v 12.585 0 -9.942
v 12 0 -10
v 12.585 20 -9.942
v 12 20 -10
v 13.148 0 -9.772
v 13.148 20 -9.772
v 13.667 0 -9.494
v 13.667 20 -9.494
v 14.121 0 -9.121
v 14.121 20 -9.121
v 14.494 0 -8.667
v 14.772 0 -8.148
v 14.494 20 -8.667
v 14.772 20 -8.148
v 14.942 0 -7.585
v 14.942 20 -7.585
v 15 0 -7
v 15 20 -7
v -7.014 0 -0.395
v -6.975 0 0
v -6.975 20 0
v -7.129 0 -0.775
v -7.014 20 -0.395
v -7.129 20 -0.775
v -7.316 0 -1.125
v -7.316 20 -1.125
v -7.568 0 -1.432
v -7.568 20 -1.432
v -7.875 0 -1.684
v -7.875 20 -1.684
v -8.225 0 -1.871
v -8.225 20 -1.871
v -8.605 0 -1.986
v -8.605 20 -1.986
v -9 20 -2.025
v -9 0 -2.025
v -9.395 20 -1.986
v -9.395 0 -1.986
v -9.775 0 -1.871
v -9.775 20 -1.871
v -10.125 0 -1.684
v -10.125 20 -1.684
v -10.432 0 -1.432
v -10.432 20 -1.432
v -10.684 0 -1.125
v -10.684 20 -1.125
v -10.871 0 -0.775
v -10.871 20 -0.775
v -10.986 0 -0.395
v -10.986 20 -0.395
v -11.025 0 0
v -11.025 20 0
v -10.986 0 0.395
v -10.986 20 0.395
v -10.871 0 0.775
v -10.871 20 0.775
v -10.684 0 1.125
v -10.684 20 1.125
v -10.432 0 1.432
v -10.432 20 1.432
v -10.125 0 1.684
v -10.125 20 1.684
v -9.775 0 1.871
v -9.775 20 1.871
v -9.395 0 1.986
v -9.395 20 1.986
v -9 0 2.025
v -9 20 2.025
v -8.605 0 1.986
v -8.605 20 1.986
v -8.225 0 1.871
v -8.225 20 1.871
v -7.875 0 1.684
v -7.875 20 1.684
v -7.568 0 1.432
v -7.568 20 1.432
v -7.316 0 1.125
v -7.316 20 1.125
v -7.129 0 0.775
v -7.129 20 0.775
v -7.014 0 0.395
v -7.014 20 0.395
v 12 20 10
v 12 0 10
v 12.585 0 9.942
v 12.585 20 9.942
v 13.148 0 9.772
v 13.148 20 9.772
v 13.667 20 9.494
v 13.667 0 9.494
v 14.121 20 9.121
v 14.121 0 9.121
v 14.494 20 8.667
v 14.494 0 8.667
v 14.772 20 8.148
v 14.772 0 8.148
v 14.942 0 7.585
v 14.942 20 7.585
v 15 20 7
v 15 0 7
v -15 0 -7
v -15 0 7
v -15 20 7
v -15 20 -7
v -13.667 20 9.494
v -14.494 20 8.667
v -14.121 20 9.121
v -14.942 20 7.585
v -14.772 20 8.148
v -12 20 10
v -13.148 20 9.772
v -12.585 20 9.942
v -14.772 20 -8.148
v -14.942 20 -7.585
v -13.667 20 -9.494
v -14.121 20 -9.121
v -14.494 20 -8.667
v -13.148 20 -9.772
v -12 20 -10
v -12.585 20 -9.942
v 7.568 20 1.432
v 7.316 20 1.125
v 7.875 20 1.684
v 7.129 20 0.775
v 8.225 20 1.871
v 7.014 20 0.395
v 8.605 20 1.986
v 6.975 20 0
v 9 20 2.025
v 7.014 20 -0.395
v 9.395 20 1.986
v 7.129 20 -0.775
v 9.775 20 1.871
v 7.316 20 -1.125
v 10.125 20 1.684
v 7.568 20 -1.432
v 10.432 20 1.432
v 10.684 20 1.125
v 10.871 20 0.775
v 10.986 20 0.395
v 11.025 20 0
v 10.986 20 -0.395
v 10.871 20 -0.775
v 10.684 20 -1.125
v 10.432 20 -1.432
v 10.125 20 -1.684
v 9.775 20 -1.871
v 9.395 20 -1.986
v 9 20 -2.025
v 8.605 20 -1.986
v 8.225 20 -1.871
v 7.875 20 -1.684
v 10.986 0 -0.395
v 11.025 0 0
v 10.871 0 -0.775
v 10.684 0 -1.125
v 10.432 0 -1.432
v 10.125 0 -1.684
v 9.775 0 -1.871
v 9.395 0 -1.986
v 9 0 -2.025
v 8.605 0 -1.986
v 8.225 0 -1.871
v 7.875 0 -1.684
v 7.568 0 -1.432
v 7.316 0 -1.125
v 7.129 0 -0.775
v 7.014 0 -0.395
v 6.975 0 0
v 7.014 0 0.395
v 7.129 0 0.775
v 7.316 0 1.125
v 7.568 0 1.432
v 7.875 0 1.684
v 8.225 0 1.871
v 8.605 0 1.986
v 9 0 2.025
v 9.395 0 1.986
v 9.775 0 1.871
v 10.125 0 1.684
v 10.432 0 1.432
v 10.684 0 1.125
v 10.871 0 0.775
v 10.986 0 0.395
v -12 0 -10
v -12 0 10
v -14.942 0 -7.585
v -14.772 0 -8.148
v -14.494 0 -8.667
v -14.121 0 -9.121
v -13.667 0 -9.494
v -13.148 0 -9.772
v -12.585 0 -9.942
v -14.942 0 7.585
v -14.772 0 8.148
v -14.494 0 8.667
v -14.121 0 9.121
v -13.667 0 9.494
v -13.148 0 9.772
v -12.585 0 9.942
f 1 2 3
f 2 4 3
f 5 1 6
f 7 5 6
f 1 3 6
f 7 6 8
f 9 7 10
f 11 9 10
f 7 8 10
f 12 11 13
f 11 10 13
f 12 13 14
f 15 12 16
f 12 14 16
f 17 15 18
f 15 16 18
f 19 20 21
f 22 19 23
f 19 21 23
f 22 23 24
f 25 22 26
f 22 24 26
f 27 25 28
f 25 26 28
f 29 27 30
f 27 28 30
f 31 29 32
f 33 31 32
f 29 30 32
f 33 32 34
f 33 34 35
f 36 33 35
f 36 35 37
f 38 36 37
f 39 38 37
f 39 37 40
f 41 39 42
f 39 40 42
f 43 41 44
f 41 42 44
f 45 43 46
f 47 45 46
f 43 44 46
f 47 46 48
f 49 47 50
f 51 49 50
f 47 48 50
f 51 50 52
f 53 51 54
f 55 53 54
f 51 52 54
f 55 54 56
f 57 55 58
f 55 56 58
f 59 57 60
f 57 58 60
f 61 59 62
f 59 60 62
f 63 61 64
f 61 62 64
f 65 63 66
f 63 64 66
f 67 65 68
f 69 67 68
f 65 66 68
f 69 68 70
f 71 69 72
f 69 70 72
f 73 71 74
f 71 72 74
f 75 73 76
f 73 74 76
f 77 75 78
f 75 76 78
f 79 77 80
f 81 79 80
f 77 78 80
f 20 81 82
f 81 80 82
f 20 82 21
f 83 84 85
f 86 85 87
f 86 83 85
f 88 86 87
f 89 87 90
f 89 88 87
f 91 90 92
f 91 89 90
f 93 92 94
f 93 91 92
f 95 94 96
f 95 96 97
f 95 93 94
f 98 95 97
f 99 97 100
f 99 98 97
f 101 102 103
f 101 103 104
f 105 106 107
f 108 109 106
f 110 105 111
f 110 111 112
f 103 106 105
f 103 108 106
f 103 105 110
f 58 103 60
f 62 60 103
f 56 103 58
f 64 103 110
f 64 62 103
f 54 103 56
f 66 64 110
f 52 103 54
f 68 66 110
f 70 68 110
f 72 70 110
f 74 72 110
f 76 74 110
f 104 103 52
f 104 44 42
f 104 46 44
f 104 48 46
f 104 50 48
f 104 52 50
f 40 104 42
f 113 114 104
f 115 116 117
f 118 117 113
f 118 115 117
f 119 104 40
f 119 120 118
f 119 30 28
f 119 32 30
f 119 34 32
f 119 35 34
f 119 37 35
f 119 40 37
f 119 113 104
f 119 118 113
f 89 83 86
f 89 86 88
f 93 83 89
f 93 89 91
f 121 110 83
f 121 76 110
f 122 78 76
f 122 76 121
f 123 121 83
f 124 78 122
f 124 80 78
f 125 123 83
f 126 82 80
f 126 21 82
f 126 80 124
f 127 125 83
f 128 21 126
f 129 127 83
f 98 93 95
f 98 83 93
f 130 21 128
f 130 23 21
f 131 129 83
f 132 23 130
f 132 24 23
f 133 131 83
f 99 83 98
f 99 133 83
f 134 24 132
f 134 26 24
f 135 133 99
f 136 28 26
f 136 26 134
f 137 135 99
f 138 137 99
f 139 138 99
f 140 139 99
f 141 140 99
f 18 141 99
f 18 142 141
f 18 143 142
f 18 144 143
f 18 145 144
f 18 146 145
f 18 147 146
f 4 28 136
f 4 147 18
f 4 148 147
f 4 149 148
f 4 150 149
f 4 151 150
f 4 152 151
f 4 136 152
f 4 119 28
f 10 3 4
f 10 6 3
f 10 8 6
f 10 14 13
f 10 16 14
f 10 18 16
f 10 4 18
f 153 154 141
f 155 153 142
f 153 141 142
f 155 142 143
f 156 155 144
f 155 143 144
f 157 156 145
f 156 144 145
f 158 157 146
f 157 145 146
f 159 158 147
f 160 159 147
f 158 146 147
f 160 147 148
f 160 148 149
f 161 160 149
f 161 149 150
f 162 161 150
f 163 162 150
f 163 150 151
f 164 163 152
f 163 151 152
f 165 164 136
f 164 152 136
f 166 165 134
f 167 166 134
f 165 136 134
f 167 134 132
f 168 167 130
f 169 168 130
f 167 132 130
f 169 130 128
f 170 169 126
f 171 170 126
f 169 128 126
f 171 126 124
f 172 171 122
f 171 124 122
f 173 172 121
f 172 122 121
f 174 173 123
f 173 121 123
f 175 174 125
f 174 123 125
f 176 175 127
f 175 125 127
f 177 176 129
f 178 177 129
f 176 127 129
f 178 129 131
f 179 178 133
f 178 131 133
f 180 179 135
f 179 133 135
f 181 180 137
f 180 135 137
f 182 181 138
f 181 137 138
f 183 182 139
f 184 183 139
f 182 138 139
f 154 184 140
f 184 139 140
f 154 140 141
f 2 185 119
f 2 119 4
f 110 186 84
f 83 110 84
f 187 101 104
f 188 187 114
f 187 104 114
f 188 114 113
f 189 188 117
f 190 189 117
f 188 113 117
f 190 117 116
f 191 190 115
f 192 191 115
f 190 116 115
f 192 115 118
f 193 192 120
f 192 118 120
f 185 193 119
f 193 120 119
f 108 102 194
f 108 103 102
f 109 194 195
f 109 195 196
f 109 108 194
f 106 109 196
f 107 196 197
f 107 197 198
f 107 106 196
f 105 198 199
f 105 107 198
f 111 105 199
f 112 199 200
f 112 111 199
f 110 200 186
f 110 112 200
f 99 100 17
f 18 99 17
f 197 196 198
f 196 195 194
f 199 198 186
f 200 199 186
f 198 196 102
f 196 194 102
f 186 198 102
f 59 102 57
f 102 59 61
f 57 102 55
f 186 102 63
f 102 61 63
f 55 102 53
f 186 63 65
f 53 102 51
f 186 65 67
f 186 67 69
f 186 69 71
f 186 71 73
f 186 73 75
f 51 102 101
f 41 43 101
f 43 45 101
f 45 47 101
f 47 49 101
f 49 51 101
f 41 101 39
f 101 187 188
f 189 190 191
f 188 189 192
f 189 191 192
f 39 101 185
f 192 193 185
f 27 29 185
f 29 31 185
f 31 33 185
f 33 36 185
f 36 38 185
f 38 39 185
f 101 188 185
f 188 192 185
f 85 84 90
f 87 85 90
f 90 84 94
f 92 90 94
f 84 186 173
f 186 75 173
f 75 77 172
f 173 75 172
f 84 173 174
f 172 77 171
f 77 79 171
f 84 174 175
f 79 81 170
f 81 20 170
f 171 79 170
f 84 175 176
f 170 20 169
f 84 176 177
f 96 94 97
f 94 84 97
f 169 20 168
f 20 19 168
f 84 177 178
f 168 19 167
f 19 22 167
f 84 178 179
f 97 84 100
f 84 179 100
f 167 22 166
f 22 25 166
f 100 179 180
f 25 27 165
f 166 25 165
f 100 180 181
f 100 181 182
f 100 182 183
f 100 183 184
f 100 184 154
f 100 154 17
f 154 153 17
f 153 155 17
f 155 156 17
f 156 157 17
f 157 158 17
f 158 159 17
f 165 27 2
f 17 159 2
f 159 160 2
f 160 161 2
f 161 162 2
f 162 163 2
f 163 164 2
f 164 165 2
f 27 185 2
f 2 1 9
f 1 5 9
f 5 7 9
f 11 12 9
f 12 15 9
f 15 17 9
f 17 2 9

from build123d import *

# Parameters (mm, degrees)
SKETCH_1_W          = 30
SKETCH_1_H          = 20
EXTRUDE_1_DEPTH     = 20
SKETCH_2_R          = 2.025
CUT_EXTRUDE_1_DEPTH = 20
FILLET_1_R          = 3


with BuildPart() as part:
    # 草图1 → 凸台-拉伸1 (new body)
    with BuildSketch(Plane(origin=(0, 0, 0), x_dir=(1, 0, 0), z_dir=(0, 1, 0))):
        Rectangle(SKETCH_1_W, SKETCH_1_H)
    extrude(amount=EXTRUDE_1_DEPTH)

    # 草图2 → 切除-拉伸1 (cut)
    with BuildSketch(Plane(origin=(0, 20, 0), x_dir=(1, 0, 0), z_dir=(0, 1, 0))):
        with Locations((-9, 0)):
            Circle(SKETCH_2_R)
        with Locations((9, 0)):
            Circle(SKETCH_2_R)
    extrude(amount=-CUT_EXTRUDE_1_DEPTH, mode=Mode.SUBTRACT)

    # 圆角1
    fillet_1_edges = [part.edges().sort_by_distance(p)[0] for p in [
        (15, 10, 10),
        (-15, 10, 10),
        (-15, 10, -10),
        (15, 10, -10),
    ]]
    fillet(fillet_1_edges, radius=FILLET_1_R)


solid = part.part
